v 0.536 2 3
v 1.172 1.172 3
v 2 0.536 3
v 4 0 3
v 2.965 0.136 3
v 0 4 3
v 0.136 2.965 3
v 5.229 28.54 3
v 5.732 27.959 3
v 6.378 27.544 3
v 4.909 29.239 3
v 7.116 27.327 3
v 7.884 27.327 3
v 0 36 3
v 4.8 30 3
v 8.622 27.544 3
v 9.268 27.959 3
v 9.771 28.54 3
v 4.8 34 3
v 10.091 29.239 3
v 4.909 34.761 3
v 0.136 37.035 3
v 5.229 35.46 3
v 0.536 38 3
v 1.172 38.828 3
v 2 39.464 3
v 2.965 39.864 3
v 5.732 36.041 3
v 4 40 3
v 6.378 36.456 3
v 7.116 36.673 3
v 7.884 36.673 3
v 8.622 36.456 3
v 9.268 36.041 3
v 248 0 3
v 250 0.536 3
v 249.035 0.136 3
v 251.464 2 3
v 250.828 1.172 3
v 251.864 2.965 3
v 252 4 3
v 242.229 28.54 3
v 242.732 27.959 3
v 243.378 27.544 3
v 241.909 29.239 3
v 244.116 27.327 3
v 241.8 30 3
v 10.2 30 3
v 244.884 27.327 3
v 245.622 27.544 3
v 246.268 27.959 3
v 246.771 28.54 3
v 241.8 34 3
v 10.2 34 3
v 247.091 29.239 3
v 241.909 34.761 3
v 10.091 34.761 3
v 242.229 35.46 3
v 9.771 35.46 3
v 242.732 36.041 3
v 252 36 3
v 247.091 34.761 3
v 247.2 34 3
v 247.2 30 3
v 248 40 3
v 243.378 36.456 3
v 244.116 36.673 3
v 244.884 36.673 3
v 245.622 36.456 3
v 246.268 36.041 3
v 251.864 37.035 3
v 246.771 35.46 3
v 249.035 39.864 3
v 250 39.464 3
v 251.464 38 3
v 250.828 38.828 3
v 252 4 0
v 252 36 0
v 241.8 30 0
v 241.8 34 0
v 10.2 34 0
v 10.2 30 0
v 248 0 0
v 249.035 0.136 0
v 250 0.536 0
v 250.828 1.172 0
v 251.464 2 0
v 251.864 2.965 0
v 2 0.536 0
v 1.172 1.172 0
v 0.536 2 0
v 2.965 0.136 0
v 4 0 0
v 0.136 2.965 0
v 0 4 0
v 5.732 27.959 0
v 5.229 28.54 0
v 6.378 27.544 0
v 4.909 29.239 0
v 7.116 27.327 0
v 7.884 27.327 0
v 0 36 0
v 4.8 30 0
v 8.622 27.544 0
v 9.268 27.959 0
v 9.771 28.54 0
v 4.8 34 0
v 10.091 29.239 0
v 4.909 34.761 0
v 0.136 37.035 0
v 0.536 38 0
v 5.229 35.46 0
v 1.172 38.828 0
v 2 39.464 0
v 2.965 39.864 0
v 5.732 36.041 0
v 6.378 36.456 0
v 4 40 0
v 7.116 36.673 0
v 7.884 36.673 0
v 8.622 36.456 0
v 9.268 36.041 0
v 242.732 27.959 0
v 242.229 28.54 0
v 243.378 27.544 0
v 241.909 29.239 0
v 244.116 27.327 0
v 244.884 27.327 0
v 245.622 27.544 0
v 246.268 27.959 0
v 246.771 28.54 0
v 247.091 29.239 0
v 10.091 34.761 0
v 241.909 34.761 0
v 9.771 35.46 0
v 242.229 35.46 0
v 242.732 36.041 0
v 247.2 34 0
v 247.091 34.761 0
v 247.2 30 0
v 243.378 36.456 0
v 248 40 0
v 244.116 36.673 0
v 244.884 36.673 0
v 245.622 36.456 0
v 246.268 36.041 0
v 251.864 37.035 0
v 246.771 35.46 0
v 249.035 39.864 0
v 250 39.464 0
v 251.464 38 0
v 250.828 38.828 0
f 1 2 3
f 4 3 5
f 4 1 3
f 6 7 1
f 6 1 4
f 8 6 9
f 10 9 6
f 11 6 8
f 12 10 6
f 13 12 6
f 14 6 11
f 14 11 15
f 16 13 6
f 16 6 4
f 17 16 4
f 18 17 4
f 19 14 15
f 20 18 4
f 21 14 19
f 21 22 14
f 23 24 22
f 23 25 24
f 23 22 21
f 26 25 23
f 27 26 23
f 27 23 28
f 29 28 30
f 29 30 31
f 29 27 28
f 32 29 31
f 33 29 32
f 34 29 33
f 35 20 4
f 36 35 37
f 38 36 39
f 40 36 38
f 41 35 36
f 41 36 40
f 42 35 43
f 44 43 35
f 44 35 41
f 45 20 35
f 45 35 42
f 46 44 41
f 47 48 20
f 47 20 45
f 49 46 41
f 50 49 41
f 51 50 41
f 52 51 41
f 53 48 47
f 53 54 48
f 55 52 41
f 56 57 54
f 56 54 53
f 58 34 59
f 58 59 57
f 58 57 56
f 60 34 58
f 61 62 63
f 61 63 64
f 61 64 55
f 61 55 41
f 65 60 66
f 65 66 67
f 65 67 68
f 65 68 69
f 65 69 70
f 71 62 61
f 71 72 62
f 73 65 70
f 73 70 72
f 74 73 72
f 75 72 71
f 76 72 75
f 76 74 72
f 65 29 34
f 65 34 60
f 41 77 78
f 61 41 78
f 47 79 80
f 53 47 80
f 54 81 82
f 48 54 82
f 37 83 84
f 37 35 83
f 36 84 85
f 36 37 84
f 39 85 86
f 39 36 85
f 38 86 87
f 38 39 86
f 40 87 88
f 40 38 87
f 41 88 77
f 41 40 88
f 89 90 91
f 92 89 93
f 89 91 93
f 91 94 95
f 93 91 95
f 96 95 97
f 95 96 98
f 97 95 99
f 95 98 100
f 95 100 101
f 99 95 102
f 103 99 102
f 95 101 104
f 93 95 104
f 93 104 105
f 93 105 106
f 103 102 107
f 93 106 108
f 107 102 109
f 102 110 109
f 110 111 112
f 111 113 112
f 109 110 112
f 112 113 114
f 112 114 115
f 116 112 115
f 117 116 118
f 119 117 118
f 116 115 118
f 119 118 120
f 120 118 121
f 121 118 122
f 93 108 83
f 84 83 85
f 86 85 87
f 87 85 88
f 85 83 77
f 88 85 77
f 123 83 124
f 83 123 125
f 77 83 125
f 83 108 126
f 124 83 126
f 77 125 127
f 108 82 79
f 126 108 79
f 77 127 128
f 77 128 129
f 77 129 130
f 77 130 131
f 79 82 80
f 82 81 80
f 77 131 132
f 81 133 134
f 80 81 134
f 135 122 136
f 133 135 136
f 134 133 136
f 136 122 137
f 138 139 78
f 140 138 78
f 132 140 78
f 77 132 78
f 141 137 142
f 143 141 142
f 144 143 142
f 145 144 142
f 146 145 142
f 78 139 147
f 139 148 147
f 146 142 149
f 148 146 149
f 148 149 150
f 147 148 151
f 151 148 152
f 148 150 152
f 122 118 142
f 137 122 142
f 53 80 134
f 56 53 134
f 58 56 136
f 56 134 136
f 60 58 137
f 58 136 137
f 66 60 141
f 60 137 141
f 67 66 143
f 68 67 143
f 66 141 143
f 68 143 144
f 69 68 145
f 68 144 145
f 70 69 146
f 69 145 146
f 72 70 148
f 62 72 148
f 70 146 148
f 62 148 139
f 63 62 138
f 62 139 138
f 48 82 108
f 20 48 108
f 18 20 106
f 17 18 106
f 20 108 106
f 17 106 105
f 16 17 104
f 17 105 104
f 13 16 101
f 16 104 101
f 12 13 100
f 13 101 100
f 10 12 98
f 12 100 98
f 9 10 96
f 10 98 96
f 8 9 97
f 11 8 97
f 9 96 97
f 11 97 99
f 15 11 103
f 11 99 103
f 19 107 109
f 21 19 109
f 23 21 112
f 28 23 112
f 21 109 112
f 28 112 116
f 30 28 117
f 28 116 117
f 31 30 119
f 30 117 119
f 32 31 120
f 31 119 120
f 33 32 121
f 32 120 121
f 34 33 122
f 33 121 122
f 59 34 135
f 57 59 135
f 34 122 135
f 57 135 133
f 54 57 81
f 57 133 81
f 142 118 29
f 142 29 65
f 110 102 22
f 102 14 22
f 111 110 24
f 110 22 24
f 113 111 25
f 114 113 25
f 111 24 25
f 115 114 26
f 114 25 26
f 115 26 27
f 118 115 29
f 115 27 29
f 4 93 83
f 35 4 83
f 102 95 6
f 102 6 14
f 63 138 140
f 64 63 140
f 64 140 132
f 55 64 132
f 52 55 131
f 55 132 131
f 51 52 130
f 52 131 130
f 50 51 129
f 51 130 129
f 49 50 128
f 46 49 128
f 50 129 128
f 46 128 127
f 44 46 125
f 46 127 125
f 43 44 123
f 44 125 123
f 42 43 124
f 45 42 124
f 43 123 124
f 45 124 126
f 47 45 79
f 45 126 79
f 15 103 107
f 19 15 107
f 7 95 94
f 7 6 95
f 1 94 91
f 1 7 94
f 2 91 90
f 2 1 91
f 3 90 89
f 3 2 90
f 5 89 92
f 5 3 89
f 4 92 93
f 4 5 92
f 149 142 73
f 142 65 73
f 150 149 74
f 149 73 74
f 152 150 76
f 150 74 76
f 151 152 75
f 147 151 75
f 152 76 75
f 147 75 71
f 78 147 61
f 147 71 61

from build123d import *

# Parameters (mm, degrees)
SKETCH1_W           = 252
SKETCH1_H           = 40
BOSS_EXTRUDE1_DEPTH = 3
FILLET1_R           = 4


with BuildPart() as part:
    # Sketch1 → Boss-Extrude1 (new body)
    with BuildSketch(Plane.XY):
        with Locations((126, 20)):
            Rectangle(SKETCH1_W, SKETCH1_H)
        with BuildLine():
            Line((10.2, 34), (10.2, 30))
            ThreePointArc((10.2, 30), (7.5, 27.3), (4.8, 30))
            Line((4.8, 30), (4.8, 34))
            ThreePointArc((4.8, 34), (7.5, 36.7), (10.2, 34))
        make_face(mode=Mode.SUBTRACT)
        with BuildLine():
            Line((247.2, 34), (247.2, 30))
            ThreePointArc((247.2, 30), (244.5, 27.3), (241.8, 30))
            Line((241.8, 30), (241.8, 34))
            ThreePointArc((241.8, 34), (244.5, 36.7), (247.2, 34))
        make_face(mode=Mode.SUBTRACT)
    extrude(amount=BOSS_EXTRUDE1_DEPTH)

    # Fillet1
    fillet1_edges = [part.edges().sort_by_distance(p)[0] for p in [
        (0, 40, 1.5),
        (252, 40, 1.5),
        (252, 0, 1.5),
        (0, 0, 1.5),
    ]]
    fillet(fillet1_edges, radius=FILLET1_R)


solid = part.part
